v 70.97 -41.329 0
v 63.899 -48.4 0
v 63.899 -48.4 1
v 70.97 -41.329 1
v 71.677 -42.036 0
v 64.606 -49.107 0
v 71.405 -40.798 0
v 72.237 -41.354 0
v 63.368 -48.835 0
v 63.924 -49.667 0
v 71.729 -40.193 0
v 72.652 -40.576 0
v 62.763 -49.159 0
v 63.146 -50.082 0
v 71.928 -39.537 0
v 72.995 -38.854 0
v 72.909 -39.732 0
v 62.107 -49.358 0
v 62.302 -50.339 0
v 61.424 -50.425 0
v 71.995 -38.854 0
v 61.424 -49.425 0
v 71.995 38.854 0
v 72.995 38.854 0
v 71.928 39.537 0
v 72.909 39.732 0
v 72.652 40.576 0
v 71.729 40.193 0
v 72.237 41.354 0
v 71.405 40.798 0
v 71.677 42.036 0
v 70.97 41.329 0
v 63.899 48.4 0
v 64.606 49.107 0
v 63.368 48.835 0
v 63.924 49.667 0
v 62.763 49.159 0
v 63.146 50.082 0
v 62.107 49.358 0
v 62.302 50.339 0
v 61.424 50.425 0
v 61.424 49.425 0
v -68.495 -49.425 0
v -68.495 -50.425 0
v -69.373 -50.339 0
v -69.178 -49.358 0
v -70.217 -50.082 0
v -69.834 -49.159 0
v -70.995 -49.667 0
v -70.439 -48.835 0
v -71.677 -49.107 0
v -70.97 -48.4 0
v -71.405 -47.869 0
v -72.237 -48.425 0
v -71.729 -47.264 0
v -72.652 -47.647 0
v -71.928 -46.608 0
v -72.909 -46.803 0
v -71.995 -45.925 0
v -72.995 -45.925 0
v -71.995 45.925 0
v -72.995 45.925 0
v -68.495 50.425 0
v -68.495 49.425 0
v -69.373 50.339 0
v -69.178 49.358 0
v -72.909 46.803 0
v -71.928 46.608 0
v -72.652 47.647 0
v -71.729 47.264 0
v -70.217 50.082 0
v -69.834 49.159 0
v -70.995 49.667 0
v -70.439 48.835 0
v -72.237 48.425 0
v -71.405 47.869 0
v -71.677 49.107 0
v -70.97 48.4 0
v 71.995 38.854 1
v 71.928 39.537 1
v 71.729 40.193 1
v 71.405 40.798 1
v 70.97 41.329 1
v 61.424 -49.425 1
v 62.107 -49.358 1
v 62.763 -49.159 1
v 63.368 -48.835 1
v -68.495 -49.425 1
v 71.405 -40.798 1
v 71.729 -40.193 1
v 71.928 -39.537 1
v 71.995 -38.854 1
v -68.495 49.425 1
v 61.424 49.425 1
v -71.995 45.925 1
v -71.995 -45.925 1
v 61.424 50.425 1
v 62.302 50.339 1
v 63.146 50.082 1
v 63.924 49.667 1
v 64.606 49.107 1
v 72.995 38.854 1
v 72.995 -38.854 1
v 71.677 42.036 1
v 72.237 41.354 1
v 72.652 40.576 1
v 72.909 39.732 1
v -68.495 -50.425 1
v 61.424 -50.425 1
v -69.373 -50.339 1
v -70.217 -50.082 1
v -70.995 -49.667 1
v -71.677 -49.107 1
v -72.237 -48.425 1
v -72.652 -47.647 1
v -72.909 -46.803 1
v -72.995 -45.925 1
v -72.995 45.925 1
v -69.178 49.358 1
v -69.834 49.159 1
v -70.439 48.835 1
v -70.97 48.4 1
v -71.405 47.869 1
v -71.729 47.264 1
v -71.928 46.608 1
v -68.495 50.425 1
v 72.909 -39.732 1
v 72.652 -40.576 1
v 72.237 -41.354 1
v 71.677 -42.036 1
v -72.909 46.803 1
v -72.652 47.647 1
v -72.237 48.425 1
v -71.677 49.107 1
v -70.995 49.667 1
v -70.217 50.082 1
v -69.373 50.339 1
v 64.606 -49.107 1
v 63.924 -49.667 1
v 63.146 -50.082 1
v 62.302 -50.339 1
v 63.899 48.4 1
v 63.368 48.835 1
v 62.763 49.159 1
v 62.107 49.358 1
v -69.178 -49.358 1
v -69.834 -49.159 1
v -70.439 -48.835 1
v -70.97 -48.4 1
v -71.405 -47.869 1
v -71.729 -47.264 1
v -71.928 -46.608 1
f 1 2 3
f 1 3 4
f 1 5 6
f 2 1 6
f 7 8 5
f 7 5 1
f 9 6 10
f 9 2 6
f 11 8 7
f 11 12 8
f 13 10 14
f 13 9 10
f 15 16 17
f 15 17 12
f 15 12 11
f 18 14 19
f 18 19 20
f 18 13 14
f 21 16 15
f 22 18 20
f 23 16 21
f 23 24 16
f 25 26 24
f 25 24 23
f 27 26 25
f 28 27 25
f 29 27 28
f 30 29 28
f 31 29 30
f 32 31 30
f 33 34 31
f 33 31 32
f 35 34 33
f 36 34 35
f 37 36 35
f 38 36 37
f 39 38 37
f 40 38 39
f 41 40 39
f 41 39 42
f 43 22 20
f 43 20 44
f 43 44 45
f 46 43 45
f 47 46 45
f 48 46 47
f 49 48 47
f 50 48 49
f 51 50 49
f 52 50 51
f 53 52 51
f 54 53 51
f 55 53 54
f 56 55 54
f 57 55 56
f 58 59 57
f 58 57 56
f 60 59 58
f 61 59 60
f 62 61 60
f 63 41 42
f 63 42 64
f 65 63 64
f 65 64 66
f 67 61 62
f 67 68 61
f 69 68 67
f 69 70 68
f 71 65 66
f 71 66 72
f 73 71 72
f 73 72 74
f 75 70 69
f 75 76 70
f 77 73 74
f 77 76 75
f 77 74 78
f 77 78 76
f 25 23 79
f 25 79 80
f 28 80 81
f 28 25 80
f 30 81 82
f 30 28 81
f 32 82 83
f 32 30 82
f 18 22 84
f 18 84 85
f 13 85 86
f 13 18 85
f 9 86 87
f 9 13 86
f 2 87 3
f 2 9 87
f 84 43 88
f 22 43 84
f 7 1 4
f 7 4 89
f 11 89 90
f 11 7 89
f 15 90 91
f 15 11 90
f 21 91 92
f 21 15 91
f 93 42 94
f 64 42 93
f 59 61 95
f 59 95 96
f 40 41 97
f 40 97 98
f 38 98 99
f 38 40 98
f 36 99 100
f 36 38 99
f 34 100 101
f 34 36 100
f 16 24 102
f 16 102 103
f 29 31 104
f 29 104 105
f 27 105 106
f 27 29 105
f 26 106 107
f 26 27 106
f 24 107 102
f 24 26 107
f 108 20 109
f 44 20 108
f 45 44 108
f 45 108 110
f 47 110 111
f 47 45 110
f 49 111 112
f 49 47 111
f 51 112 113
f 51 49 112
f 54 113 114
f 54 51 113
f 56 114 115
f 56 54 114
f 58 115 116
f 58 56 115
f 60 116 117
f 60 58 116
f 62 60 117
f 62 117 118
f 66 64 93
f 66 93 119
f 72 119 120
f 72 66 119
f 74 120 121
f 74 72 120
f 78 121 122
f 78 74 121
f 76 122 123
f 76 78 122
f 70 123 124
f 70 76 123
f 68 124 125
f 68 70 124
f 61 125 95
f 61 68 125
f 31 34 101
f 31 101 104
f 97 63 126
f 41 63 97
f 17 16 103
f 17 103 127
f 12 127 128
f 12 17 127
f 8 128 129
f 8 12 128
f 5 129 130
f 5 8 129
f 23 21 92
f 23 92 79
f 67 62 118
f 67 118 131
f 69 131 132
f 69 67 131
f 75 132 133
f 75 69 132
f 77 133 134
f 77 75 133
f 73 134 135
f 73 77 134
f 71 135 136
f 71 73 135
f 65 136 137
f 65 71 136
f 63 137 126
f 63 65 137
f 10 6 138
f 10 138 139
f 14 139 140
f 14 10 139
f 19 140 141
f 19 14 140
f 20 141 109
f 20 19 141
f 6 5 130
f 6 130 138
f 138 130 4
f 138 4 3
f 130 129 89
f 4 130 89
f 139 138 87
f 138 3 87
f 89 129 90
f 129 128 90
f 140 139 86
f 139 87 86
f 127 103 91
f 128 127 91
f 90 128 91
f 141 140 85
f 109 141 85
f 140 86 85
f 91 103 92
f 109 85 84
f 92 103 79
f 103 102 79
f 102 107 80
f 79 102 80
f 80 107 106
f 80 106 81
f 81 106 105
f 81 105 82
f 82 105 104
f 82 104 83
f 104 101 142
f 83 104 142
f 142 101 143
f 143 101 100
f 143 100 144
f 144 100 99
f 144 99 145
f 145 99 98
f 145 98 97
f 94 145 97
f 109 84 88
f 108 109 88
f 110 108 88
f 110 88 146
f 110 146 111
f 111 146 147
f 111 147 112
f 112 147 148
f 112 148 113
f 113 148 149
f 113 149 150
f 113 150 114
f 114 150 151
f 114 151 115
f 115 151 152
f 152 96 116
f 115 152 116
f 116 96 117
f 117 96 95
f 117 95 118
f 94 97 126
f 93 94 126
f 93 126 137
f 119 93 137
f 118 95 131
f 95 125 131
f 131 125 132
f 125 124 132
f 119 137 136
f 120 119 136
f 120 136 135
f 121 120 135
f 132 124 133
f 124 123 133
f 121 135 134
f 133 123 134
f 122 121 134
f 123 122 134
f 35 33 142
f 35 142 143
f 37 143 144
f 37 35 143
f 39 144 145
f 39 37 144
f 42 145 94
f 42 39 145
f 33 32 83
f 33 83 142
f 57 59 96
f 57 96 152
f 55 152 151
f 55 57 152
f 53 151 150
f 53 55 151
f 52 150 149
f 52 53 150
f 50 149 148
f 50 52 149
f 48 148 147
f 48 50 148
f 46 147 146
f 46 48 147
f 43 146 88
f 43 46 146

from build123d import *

# Parameters (mm, degrees)
BOSS_EXTRUDE1_DEPTH = 1


with BuildPart() as part:
    # Sketch1 → Boss-Extrude1 (new body)
    with BuildSketch(Plane.XY):
        with BuildLine():
            Line((-72.995, -45.925), (-72.995, 45.925))
            ThreePointArc((-72.995, 45.925), (-71.676980515, 49.106980515), (-68.495, 50.425))
            Line((-68.495, 50.425), (61.423932188, 50.425))
            ThreePointArc((61.423932188, 50.425), (63.146007634, 50.082457896), (64.605912703, 49.106980515))
            Line((64.605912703, 49.106980515), (71.676980515, 42.035912703))
            ThreePointArc((71.676980515, 42.035912703), (72.652457896, 40.576007634), (72.995, 38.853932188))
            Line((72.995, 38.853932188), (72.995, -38.853932188))
            ThreePointArc((72.995, -38.853932188), (72.652457896, -40.576007634), (71.676980515, -42.035912703))
            Line((71.676980515, -42.035912703), (64.605912703, -49.106980515))
            ThreePointArc((64.605912703, -49.106980515), (63.146007634, -50.082457896), (61.423932188, -50.425))
            Line((61.423932188, -50.425), (-68.495, -50.425))
            ThreePointArc((-68.495, -50.425), (-71.676980515, -49.106980515), (-72.995, -45.925))
        make_face()
        with BuildLine():
            Line((-71.995, 45.925), (-71.995, -45.925))
            ThreePointArc((-71.995, -45.925), (-70.969873734, -48.399873734), (-68.495, -49.425))
            Line((-68.495, -49.425), (61.423932188, -49.425))
            ThreePointArc((61.423932188, -49.425), (62.763324201, -49.158578364), (63.898805922, -48.399873734))
            Line((63.898805922, -48.399873734), (70.969873734, -41.328805922))
            ThreePointArc((70.969873734, -41.328805922), (71.728578364, -40.193324201), (71.995, -38.853932188))
            Line((71.995, -38.853932188), (71.995, 38.853932188))
            ThreePointArc((71.995, 38.853932188), (71.728578364, 40.193324201), (70.969873734, 41.328805922))
            Line((70.969873734, 41.328805922), (63.898805922, 48.399873734))
            ThreePointArc((63.898805922, 48.399873734), (62.763324201, 49.158578364), (61.423932188, 49.425))
            Line((61.423932188, 49.425), (-68.495, 49.425))
            ThreePointArc((-68.495, 49.425), (-70.969873734, 48.399873734), (-71.995, 45.925))
        make_face(mode=Mode.SUBTRACT)
    extrude(amount=BOSS_EXTRUDE1_DEPTH)


solid = part.part
